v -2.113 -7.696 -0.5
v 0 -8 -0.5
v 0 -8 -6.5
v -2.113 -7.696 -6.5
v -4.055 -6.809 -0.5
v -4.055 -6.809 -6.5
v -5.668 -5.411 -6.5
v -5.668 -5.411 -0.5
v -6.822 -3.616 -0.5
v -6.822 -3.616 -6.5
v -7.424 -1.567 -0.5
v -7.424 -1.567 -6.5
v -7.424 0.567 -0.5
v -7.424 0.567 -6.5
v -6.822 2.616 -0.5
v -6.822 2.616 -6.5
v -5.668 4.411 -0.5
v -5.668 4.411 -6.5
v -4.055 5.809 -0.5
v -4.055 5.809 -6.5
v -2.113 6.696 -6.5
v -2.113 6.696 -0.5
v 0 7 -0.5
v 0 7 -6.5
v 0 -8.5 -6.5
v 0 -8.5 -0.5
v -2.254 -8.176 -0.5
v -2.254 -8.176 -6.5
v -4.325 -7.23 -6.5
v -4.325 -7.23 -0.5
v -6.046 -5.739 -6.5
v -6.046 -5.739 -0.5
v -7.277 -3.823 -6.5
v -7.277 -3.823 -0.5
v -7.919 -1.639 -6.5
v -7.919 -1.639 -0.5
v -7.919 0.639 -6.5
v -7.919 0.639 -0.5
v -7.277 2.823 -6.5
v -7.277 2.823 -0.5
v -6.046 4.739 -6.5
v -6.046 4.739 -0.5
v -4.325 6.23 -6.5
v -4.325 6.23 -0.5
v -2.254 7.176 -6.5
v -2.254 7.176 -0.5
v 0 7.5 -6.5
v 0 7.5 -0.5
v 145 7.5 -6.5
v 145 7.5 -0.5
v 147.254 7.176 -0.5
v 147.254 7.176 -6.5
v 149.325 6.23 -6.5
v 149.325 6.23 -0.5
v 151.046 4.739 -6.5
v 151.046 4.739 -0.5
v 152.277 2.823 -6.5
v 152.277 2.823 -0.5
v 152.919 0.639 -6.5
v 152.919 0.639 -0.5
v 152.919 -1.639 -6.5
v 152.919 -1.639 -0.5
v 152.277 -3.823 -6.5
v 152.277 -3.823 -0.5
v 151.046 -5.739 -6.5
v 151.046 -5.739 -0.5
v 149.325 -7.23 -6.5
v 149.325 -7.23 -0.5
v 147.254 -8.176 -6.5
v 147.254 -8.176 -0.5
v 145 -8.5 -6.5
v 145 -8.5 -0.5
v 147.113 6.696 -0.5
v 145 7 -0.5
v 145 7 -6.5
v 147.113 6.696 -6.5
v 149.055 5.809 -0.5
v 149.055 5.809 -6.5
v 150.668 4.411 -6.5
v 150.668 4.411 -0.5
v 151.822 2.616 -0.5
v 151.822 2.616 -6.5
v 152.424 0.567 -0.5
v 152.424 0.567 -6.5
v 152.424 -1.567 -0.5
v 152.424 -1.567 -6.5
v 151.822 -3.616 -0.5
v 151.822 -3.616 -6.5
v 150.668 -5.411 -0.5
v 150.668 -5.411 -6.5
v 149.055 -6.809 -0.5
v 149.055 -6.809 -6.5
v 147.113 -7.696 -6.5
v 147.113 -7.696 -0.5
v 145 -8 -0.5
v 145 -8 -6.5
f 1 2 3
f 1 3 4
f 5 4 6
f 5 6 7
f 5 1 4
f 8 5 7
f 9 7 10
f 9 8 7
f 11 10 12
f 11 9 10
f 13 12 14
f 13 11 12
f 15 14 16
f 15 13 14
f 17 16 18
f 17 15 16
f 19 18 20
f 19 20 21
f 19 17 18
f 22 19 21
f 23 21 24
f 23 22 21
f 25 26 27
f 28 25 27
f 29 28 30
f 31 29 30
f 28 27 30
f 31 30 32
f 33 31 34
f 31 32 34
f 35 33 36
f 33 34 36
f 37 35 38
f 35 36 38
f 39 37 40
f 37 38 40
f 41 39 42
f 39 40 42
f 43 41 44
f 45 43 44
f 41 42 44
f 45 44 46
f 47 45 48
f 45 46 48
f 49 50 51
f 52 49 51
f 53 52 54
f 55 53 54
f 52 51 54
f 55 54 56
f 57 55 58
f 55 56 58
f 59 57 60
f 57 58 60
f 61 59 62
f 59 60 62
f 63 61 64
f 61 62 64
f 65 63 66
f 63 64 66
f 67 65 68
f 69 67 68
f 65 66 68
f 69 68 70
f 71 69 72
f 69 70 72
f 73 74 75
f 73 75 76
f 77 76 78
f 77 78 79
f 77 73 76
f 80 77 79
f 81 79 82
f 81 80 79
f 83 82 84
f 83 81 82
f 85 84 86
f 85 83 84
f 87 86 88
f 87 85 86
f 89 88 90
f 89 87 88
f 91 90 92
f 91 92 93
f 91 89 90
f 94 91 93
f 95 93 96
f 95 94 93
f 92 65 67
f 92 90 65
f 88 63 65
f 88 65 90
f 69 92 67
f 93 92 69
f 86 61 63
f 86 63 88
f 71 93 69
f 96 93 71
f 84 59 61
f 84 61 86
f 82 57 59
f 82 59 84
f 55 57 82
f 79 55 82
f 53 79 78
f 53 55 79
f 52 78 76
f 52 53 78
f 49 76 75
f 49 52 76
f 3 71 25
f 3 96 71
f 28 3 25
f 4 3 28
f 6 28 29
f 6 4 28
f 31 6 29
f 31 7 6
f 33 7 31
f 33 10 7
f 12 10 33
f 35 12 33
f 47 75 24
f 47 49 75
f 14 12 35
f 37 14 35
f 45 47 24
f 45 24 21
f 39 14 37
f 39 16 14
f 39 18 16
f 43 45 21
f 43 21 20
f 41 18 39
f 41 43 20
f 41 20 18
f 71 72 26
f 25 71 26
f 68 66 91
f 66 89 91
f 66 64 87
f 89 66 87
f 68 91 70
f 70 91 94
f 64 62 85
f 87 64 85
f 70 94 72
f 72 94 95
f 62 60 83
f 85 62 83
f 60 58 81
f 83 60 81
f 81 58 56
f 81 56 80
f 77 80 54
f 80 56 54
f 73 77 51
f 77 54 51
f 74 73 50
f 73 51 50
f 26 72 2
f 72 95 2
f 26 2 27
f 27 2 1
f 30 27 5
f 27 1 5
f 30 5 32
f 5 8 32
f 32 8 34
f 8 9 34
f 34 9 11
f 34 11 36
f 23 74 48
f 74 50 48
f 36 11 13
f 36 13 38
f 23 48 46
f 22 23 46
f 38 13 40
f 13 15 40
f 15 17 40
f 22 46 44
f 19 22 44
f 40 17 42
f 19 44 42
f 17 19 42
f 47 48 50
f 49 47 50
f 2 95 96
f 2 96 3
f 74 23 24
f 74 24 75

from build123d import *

# Parameters (mm, degrees)
EXTRUDE_THIN1_START = -0.5
EXTRUDE_THIN1_DEPTH = 6


with BuildPart() as part:
    # Sketch2 → Extrude-Thin1 (new body)
    with BuildSketch(Plane.XY.offset(EXTRUDE_THIN1_START)):
        with BuildLine():
            Line((145, -8.5), (0, -8.5))
            ThreePointArc((0, -8.5), (-8, -0.5), (0, 7.5))
            Line((0, 7.5), (145, 7.5))
            ThreePointArc((145, 7.5), (153, -0.5), (145, -8.5))
        make_face()
        with BuildLine():
            Line((145, -8), (0, -8))
            ThreePointArc((0, -8), (-7.5, -0.5), (0, 7))
            Line((0, 7), (145, 7))
            ThreePointArc((145, 7), (152.5, -0.5), (145, -8))
        make_face(mode=Mode.SUBTRACT)
    extrude(amount=-EXTRUDE_THIN1_DEPTH)


solid = part.part
